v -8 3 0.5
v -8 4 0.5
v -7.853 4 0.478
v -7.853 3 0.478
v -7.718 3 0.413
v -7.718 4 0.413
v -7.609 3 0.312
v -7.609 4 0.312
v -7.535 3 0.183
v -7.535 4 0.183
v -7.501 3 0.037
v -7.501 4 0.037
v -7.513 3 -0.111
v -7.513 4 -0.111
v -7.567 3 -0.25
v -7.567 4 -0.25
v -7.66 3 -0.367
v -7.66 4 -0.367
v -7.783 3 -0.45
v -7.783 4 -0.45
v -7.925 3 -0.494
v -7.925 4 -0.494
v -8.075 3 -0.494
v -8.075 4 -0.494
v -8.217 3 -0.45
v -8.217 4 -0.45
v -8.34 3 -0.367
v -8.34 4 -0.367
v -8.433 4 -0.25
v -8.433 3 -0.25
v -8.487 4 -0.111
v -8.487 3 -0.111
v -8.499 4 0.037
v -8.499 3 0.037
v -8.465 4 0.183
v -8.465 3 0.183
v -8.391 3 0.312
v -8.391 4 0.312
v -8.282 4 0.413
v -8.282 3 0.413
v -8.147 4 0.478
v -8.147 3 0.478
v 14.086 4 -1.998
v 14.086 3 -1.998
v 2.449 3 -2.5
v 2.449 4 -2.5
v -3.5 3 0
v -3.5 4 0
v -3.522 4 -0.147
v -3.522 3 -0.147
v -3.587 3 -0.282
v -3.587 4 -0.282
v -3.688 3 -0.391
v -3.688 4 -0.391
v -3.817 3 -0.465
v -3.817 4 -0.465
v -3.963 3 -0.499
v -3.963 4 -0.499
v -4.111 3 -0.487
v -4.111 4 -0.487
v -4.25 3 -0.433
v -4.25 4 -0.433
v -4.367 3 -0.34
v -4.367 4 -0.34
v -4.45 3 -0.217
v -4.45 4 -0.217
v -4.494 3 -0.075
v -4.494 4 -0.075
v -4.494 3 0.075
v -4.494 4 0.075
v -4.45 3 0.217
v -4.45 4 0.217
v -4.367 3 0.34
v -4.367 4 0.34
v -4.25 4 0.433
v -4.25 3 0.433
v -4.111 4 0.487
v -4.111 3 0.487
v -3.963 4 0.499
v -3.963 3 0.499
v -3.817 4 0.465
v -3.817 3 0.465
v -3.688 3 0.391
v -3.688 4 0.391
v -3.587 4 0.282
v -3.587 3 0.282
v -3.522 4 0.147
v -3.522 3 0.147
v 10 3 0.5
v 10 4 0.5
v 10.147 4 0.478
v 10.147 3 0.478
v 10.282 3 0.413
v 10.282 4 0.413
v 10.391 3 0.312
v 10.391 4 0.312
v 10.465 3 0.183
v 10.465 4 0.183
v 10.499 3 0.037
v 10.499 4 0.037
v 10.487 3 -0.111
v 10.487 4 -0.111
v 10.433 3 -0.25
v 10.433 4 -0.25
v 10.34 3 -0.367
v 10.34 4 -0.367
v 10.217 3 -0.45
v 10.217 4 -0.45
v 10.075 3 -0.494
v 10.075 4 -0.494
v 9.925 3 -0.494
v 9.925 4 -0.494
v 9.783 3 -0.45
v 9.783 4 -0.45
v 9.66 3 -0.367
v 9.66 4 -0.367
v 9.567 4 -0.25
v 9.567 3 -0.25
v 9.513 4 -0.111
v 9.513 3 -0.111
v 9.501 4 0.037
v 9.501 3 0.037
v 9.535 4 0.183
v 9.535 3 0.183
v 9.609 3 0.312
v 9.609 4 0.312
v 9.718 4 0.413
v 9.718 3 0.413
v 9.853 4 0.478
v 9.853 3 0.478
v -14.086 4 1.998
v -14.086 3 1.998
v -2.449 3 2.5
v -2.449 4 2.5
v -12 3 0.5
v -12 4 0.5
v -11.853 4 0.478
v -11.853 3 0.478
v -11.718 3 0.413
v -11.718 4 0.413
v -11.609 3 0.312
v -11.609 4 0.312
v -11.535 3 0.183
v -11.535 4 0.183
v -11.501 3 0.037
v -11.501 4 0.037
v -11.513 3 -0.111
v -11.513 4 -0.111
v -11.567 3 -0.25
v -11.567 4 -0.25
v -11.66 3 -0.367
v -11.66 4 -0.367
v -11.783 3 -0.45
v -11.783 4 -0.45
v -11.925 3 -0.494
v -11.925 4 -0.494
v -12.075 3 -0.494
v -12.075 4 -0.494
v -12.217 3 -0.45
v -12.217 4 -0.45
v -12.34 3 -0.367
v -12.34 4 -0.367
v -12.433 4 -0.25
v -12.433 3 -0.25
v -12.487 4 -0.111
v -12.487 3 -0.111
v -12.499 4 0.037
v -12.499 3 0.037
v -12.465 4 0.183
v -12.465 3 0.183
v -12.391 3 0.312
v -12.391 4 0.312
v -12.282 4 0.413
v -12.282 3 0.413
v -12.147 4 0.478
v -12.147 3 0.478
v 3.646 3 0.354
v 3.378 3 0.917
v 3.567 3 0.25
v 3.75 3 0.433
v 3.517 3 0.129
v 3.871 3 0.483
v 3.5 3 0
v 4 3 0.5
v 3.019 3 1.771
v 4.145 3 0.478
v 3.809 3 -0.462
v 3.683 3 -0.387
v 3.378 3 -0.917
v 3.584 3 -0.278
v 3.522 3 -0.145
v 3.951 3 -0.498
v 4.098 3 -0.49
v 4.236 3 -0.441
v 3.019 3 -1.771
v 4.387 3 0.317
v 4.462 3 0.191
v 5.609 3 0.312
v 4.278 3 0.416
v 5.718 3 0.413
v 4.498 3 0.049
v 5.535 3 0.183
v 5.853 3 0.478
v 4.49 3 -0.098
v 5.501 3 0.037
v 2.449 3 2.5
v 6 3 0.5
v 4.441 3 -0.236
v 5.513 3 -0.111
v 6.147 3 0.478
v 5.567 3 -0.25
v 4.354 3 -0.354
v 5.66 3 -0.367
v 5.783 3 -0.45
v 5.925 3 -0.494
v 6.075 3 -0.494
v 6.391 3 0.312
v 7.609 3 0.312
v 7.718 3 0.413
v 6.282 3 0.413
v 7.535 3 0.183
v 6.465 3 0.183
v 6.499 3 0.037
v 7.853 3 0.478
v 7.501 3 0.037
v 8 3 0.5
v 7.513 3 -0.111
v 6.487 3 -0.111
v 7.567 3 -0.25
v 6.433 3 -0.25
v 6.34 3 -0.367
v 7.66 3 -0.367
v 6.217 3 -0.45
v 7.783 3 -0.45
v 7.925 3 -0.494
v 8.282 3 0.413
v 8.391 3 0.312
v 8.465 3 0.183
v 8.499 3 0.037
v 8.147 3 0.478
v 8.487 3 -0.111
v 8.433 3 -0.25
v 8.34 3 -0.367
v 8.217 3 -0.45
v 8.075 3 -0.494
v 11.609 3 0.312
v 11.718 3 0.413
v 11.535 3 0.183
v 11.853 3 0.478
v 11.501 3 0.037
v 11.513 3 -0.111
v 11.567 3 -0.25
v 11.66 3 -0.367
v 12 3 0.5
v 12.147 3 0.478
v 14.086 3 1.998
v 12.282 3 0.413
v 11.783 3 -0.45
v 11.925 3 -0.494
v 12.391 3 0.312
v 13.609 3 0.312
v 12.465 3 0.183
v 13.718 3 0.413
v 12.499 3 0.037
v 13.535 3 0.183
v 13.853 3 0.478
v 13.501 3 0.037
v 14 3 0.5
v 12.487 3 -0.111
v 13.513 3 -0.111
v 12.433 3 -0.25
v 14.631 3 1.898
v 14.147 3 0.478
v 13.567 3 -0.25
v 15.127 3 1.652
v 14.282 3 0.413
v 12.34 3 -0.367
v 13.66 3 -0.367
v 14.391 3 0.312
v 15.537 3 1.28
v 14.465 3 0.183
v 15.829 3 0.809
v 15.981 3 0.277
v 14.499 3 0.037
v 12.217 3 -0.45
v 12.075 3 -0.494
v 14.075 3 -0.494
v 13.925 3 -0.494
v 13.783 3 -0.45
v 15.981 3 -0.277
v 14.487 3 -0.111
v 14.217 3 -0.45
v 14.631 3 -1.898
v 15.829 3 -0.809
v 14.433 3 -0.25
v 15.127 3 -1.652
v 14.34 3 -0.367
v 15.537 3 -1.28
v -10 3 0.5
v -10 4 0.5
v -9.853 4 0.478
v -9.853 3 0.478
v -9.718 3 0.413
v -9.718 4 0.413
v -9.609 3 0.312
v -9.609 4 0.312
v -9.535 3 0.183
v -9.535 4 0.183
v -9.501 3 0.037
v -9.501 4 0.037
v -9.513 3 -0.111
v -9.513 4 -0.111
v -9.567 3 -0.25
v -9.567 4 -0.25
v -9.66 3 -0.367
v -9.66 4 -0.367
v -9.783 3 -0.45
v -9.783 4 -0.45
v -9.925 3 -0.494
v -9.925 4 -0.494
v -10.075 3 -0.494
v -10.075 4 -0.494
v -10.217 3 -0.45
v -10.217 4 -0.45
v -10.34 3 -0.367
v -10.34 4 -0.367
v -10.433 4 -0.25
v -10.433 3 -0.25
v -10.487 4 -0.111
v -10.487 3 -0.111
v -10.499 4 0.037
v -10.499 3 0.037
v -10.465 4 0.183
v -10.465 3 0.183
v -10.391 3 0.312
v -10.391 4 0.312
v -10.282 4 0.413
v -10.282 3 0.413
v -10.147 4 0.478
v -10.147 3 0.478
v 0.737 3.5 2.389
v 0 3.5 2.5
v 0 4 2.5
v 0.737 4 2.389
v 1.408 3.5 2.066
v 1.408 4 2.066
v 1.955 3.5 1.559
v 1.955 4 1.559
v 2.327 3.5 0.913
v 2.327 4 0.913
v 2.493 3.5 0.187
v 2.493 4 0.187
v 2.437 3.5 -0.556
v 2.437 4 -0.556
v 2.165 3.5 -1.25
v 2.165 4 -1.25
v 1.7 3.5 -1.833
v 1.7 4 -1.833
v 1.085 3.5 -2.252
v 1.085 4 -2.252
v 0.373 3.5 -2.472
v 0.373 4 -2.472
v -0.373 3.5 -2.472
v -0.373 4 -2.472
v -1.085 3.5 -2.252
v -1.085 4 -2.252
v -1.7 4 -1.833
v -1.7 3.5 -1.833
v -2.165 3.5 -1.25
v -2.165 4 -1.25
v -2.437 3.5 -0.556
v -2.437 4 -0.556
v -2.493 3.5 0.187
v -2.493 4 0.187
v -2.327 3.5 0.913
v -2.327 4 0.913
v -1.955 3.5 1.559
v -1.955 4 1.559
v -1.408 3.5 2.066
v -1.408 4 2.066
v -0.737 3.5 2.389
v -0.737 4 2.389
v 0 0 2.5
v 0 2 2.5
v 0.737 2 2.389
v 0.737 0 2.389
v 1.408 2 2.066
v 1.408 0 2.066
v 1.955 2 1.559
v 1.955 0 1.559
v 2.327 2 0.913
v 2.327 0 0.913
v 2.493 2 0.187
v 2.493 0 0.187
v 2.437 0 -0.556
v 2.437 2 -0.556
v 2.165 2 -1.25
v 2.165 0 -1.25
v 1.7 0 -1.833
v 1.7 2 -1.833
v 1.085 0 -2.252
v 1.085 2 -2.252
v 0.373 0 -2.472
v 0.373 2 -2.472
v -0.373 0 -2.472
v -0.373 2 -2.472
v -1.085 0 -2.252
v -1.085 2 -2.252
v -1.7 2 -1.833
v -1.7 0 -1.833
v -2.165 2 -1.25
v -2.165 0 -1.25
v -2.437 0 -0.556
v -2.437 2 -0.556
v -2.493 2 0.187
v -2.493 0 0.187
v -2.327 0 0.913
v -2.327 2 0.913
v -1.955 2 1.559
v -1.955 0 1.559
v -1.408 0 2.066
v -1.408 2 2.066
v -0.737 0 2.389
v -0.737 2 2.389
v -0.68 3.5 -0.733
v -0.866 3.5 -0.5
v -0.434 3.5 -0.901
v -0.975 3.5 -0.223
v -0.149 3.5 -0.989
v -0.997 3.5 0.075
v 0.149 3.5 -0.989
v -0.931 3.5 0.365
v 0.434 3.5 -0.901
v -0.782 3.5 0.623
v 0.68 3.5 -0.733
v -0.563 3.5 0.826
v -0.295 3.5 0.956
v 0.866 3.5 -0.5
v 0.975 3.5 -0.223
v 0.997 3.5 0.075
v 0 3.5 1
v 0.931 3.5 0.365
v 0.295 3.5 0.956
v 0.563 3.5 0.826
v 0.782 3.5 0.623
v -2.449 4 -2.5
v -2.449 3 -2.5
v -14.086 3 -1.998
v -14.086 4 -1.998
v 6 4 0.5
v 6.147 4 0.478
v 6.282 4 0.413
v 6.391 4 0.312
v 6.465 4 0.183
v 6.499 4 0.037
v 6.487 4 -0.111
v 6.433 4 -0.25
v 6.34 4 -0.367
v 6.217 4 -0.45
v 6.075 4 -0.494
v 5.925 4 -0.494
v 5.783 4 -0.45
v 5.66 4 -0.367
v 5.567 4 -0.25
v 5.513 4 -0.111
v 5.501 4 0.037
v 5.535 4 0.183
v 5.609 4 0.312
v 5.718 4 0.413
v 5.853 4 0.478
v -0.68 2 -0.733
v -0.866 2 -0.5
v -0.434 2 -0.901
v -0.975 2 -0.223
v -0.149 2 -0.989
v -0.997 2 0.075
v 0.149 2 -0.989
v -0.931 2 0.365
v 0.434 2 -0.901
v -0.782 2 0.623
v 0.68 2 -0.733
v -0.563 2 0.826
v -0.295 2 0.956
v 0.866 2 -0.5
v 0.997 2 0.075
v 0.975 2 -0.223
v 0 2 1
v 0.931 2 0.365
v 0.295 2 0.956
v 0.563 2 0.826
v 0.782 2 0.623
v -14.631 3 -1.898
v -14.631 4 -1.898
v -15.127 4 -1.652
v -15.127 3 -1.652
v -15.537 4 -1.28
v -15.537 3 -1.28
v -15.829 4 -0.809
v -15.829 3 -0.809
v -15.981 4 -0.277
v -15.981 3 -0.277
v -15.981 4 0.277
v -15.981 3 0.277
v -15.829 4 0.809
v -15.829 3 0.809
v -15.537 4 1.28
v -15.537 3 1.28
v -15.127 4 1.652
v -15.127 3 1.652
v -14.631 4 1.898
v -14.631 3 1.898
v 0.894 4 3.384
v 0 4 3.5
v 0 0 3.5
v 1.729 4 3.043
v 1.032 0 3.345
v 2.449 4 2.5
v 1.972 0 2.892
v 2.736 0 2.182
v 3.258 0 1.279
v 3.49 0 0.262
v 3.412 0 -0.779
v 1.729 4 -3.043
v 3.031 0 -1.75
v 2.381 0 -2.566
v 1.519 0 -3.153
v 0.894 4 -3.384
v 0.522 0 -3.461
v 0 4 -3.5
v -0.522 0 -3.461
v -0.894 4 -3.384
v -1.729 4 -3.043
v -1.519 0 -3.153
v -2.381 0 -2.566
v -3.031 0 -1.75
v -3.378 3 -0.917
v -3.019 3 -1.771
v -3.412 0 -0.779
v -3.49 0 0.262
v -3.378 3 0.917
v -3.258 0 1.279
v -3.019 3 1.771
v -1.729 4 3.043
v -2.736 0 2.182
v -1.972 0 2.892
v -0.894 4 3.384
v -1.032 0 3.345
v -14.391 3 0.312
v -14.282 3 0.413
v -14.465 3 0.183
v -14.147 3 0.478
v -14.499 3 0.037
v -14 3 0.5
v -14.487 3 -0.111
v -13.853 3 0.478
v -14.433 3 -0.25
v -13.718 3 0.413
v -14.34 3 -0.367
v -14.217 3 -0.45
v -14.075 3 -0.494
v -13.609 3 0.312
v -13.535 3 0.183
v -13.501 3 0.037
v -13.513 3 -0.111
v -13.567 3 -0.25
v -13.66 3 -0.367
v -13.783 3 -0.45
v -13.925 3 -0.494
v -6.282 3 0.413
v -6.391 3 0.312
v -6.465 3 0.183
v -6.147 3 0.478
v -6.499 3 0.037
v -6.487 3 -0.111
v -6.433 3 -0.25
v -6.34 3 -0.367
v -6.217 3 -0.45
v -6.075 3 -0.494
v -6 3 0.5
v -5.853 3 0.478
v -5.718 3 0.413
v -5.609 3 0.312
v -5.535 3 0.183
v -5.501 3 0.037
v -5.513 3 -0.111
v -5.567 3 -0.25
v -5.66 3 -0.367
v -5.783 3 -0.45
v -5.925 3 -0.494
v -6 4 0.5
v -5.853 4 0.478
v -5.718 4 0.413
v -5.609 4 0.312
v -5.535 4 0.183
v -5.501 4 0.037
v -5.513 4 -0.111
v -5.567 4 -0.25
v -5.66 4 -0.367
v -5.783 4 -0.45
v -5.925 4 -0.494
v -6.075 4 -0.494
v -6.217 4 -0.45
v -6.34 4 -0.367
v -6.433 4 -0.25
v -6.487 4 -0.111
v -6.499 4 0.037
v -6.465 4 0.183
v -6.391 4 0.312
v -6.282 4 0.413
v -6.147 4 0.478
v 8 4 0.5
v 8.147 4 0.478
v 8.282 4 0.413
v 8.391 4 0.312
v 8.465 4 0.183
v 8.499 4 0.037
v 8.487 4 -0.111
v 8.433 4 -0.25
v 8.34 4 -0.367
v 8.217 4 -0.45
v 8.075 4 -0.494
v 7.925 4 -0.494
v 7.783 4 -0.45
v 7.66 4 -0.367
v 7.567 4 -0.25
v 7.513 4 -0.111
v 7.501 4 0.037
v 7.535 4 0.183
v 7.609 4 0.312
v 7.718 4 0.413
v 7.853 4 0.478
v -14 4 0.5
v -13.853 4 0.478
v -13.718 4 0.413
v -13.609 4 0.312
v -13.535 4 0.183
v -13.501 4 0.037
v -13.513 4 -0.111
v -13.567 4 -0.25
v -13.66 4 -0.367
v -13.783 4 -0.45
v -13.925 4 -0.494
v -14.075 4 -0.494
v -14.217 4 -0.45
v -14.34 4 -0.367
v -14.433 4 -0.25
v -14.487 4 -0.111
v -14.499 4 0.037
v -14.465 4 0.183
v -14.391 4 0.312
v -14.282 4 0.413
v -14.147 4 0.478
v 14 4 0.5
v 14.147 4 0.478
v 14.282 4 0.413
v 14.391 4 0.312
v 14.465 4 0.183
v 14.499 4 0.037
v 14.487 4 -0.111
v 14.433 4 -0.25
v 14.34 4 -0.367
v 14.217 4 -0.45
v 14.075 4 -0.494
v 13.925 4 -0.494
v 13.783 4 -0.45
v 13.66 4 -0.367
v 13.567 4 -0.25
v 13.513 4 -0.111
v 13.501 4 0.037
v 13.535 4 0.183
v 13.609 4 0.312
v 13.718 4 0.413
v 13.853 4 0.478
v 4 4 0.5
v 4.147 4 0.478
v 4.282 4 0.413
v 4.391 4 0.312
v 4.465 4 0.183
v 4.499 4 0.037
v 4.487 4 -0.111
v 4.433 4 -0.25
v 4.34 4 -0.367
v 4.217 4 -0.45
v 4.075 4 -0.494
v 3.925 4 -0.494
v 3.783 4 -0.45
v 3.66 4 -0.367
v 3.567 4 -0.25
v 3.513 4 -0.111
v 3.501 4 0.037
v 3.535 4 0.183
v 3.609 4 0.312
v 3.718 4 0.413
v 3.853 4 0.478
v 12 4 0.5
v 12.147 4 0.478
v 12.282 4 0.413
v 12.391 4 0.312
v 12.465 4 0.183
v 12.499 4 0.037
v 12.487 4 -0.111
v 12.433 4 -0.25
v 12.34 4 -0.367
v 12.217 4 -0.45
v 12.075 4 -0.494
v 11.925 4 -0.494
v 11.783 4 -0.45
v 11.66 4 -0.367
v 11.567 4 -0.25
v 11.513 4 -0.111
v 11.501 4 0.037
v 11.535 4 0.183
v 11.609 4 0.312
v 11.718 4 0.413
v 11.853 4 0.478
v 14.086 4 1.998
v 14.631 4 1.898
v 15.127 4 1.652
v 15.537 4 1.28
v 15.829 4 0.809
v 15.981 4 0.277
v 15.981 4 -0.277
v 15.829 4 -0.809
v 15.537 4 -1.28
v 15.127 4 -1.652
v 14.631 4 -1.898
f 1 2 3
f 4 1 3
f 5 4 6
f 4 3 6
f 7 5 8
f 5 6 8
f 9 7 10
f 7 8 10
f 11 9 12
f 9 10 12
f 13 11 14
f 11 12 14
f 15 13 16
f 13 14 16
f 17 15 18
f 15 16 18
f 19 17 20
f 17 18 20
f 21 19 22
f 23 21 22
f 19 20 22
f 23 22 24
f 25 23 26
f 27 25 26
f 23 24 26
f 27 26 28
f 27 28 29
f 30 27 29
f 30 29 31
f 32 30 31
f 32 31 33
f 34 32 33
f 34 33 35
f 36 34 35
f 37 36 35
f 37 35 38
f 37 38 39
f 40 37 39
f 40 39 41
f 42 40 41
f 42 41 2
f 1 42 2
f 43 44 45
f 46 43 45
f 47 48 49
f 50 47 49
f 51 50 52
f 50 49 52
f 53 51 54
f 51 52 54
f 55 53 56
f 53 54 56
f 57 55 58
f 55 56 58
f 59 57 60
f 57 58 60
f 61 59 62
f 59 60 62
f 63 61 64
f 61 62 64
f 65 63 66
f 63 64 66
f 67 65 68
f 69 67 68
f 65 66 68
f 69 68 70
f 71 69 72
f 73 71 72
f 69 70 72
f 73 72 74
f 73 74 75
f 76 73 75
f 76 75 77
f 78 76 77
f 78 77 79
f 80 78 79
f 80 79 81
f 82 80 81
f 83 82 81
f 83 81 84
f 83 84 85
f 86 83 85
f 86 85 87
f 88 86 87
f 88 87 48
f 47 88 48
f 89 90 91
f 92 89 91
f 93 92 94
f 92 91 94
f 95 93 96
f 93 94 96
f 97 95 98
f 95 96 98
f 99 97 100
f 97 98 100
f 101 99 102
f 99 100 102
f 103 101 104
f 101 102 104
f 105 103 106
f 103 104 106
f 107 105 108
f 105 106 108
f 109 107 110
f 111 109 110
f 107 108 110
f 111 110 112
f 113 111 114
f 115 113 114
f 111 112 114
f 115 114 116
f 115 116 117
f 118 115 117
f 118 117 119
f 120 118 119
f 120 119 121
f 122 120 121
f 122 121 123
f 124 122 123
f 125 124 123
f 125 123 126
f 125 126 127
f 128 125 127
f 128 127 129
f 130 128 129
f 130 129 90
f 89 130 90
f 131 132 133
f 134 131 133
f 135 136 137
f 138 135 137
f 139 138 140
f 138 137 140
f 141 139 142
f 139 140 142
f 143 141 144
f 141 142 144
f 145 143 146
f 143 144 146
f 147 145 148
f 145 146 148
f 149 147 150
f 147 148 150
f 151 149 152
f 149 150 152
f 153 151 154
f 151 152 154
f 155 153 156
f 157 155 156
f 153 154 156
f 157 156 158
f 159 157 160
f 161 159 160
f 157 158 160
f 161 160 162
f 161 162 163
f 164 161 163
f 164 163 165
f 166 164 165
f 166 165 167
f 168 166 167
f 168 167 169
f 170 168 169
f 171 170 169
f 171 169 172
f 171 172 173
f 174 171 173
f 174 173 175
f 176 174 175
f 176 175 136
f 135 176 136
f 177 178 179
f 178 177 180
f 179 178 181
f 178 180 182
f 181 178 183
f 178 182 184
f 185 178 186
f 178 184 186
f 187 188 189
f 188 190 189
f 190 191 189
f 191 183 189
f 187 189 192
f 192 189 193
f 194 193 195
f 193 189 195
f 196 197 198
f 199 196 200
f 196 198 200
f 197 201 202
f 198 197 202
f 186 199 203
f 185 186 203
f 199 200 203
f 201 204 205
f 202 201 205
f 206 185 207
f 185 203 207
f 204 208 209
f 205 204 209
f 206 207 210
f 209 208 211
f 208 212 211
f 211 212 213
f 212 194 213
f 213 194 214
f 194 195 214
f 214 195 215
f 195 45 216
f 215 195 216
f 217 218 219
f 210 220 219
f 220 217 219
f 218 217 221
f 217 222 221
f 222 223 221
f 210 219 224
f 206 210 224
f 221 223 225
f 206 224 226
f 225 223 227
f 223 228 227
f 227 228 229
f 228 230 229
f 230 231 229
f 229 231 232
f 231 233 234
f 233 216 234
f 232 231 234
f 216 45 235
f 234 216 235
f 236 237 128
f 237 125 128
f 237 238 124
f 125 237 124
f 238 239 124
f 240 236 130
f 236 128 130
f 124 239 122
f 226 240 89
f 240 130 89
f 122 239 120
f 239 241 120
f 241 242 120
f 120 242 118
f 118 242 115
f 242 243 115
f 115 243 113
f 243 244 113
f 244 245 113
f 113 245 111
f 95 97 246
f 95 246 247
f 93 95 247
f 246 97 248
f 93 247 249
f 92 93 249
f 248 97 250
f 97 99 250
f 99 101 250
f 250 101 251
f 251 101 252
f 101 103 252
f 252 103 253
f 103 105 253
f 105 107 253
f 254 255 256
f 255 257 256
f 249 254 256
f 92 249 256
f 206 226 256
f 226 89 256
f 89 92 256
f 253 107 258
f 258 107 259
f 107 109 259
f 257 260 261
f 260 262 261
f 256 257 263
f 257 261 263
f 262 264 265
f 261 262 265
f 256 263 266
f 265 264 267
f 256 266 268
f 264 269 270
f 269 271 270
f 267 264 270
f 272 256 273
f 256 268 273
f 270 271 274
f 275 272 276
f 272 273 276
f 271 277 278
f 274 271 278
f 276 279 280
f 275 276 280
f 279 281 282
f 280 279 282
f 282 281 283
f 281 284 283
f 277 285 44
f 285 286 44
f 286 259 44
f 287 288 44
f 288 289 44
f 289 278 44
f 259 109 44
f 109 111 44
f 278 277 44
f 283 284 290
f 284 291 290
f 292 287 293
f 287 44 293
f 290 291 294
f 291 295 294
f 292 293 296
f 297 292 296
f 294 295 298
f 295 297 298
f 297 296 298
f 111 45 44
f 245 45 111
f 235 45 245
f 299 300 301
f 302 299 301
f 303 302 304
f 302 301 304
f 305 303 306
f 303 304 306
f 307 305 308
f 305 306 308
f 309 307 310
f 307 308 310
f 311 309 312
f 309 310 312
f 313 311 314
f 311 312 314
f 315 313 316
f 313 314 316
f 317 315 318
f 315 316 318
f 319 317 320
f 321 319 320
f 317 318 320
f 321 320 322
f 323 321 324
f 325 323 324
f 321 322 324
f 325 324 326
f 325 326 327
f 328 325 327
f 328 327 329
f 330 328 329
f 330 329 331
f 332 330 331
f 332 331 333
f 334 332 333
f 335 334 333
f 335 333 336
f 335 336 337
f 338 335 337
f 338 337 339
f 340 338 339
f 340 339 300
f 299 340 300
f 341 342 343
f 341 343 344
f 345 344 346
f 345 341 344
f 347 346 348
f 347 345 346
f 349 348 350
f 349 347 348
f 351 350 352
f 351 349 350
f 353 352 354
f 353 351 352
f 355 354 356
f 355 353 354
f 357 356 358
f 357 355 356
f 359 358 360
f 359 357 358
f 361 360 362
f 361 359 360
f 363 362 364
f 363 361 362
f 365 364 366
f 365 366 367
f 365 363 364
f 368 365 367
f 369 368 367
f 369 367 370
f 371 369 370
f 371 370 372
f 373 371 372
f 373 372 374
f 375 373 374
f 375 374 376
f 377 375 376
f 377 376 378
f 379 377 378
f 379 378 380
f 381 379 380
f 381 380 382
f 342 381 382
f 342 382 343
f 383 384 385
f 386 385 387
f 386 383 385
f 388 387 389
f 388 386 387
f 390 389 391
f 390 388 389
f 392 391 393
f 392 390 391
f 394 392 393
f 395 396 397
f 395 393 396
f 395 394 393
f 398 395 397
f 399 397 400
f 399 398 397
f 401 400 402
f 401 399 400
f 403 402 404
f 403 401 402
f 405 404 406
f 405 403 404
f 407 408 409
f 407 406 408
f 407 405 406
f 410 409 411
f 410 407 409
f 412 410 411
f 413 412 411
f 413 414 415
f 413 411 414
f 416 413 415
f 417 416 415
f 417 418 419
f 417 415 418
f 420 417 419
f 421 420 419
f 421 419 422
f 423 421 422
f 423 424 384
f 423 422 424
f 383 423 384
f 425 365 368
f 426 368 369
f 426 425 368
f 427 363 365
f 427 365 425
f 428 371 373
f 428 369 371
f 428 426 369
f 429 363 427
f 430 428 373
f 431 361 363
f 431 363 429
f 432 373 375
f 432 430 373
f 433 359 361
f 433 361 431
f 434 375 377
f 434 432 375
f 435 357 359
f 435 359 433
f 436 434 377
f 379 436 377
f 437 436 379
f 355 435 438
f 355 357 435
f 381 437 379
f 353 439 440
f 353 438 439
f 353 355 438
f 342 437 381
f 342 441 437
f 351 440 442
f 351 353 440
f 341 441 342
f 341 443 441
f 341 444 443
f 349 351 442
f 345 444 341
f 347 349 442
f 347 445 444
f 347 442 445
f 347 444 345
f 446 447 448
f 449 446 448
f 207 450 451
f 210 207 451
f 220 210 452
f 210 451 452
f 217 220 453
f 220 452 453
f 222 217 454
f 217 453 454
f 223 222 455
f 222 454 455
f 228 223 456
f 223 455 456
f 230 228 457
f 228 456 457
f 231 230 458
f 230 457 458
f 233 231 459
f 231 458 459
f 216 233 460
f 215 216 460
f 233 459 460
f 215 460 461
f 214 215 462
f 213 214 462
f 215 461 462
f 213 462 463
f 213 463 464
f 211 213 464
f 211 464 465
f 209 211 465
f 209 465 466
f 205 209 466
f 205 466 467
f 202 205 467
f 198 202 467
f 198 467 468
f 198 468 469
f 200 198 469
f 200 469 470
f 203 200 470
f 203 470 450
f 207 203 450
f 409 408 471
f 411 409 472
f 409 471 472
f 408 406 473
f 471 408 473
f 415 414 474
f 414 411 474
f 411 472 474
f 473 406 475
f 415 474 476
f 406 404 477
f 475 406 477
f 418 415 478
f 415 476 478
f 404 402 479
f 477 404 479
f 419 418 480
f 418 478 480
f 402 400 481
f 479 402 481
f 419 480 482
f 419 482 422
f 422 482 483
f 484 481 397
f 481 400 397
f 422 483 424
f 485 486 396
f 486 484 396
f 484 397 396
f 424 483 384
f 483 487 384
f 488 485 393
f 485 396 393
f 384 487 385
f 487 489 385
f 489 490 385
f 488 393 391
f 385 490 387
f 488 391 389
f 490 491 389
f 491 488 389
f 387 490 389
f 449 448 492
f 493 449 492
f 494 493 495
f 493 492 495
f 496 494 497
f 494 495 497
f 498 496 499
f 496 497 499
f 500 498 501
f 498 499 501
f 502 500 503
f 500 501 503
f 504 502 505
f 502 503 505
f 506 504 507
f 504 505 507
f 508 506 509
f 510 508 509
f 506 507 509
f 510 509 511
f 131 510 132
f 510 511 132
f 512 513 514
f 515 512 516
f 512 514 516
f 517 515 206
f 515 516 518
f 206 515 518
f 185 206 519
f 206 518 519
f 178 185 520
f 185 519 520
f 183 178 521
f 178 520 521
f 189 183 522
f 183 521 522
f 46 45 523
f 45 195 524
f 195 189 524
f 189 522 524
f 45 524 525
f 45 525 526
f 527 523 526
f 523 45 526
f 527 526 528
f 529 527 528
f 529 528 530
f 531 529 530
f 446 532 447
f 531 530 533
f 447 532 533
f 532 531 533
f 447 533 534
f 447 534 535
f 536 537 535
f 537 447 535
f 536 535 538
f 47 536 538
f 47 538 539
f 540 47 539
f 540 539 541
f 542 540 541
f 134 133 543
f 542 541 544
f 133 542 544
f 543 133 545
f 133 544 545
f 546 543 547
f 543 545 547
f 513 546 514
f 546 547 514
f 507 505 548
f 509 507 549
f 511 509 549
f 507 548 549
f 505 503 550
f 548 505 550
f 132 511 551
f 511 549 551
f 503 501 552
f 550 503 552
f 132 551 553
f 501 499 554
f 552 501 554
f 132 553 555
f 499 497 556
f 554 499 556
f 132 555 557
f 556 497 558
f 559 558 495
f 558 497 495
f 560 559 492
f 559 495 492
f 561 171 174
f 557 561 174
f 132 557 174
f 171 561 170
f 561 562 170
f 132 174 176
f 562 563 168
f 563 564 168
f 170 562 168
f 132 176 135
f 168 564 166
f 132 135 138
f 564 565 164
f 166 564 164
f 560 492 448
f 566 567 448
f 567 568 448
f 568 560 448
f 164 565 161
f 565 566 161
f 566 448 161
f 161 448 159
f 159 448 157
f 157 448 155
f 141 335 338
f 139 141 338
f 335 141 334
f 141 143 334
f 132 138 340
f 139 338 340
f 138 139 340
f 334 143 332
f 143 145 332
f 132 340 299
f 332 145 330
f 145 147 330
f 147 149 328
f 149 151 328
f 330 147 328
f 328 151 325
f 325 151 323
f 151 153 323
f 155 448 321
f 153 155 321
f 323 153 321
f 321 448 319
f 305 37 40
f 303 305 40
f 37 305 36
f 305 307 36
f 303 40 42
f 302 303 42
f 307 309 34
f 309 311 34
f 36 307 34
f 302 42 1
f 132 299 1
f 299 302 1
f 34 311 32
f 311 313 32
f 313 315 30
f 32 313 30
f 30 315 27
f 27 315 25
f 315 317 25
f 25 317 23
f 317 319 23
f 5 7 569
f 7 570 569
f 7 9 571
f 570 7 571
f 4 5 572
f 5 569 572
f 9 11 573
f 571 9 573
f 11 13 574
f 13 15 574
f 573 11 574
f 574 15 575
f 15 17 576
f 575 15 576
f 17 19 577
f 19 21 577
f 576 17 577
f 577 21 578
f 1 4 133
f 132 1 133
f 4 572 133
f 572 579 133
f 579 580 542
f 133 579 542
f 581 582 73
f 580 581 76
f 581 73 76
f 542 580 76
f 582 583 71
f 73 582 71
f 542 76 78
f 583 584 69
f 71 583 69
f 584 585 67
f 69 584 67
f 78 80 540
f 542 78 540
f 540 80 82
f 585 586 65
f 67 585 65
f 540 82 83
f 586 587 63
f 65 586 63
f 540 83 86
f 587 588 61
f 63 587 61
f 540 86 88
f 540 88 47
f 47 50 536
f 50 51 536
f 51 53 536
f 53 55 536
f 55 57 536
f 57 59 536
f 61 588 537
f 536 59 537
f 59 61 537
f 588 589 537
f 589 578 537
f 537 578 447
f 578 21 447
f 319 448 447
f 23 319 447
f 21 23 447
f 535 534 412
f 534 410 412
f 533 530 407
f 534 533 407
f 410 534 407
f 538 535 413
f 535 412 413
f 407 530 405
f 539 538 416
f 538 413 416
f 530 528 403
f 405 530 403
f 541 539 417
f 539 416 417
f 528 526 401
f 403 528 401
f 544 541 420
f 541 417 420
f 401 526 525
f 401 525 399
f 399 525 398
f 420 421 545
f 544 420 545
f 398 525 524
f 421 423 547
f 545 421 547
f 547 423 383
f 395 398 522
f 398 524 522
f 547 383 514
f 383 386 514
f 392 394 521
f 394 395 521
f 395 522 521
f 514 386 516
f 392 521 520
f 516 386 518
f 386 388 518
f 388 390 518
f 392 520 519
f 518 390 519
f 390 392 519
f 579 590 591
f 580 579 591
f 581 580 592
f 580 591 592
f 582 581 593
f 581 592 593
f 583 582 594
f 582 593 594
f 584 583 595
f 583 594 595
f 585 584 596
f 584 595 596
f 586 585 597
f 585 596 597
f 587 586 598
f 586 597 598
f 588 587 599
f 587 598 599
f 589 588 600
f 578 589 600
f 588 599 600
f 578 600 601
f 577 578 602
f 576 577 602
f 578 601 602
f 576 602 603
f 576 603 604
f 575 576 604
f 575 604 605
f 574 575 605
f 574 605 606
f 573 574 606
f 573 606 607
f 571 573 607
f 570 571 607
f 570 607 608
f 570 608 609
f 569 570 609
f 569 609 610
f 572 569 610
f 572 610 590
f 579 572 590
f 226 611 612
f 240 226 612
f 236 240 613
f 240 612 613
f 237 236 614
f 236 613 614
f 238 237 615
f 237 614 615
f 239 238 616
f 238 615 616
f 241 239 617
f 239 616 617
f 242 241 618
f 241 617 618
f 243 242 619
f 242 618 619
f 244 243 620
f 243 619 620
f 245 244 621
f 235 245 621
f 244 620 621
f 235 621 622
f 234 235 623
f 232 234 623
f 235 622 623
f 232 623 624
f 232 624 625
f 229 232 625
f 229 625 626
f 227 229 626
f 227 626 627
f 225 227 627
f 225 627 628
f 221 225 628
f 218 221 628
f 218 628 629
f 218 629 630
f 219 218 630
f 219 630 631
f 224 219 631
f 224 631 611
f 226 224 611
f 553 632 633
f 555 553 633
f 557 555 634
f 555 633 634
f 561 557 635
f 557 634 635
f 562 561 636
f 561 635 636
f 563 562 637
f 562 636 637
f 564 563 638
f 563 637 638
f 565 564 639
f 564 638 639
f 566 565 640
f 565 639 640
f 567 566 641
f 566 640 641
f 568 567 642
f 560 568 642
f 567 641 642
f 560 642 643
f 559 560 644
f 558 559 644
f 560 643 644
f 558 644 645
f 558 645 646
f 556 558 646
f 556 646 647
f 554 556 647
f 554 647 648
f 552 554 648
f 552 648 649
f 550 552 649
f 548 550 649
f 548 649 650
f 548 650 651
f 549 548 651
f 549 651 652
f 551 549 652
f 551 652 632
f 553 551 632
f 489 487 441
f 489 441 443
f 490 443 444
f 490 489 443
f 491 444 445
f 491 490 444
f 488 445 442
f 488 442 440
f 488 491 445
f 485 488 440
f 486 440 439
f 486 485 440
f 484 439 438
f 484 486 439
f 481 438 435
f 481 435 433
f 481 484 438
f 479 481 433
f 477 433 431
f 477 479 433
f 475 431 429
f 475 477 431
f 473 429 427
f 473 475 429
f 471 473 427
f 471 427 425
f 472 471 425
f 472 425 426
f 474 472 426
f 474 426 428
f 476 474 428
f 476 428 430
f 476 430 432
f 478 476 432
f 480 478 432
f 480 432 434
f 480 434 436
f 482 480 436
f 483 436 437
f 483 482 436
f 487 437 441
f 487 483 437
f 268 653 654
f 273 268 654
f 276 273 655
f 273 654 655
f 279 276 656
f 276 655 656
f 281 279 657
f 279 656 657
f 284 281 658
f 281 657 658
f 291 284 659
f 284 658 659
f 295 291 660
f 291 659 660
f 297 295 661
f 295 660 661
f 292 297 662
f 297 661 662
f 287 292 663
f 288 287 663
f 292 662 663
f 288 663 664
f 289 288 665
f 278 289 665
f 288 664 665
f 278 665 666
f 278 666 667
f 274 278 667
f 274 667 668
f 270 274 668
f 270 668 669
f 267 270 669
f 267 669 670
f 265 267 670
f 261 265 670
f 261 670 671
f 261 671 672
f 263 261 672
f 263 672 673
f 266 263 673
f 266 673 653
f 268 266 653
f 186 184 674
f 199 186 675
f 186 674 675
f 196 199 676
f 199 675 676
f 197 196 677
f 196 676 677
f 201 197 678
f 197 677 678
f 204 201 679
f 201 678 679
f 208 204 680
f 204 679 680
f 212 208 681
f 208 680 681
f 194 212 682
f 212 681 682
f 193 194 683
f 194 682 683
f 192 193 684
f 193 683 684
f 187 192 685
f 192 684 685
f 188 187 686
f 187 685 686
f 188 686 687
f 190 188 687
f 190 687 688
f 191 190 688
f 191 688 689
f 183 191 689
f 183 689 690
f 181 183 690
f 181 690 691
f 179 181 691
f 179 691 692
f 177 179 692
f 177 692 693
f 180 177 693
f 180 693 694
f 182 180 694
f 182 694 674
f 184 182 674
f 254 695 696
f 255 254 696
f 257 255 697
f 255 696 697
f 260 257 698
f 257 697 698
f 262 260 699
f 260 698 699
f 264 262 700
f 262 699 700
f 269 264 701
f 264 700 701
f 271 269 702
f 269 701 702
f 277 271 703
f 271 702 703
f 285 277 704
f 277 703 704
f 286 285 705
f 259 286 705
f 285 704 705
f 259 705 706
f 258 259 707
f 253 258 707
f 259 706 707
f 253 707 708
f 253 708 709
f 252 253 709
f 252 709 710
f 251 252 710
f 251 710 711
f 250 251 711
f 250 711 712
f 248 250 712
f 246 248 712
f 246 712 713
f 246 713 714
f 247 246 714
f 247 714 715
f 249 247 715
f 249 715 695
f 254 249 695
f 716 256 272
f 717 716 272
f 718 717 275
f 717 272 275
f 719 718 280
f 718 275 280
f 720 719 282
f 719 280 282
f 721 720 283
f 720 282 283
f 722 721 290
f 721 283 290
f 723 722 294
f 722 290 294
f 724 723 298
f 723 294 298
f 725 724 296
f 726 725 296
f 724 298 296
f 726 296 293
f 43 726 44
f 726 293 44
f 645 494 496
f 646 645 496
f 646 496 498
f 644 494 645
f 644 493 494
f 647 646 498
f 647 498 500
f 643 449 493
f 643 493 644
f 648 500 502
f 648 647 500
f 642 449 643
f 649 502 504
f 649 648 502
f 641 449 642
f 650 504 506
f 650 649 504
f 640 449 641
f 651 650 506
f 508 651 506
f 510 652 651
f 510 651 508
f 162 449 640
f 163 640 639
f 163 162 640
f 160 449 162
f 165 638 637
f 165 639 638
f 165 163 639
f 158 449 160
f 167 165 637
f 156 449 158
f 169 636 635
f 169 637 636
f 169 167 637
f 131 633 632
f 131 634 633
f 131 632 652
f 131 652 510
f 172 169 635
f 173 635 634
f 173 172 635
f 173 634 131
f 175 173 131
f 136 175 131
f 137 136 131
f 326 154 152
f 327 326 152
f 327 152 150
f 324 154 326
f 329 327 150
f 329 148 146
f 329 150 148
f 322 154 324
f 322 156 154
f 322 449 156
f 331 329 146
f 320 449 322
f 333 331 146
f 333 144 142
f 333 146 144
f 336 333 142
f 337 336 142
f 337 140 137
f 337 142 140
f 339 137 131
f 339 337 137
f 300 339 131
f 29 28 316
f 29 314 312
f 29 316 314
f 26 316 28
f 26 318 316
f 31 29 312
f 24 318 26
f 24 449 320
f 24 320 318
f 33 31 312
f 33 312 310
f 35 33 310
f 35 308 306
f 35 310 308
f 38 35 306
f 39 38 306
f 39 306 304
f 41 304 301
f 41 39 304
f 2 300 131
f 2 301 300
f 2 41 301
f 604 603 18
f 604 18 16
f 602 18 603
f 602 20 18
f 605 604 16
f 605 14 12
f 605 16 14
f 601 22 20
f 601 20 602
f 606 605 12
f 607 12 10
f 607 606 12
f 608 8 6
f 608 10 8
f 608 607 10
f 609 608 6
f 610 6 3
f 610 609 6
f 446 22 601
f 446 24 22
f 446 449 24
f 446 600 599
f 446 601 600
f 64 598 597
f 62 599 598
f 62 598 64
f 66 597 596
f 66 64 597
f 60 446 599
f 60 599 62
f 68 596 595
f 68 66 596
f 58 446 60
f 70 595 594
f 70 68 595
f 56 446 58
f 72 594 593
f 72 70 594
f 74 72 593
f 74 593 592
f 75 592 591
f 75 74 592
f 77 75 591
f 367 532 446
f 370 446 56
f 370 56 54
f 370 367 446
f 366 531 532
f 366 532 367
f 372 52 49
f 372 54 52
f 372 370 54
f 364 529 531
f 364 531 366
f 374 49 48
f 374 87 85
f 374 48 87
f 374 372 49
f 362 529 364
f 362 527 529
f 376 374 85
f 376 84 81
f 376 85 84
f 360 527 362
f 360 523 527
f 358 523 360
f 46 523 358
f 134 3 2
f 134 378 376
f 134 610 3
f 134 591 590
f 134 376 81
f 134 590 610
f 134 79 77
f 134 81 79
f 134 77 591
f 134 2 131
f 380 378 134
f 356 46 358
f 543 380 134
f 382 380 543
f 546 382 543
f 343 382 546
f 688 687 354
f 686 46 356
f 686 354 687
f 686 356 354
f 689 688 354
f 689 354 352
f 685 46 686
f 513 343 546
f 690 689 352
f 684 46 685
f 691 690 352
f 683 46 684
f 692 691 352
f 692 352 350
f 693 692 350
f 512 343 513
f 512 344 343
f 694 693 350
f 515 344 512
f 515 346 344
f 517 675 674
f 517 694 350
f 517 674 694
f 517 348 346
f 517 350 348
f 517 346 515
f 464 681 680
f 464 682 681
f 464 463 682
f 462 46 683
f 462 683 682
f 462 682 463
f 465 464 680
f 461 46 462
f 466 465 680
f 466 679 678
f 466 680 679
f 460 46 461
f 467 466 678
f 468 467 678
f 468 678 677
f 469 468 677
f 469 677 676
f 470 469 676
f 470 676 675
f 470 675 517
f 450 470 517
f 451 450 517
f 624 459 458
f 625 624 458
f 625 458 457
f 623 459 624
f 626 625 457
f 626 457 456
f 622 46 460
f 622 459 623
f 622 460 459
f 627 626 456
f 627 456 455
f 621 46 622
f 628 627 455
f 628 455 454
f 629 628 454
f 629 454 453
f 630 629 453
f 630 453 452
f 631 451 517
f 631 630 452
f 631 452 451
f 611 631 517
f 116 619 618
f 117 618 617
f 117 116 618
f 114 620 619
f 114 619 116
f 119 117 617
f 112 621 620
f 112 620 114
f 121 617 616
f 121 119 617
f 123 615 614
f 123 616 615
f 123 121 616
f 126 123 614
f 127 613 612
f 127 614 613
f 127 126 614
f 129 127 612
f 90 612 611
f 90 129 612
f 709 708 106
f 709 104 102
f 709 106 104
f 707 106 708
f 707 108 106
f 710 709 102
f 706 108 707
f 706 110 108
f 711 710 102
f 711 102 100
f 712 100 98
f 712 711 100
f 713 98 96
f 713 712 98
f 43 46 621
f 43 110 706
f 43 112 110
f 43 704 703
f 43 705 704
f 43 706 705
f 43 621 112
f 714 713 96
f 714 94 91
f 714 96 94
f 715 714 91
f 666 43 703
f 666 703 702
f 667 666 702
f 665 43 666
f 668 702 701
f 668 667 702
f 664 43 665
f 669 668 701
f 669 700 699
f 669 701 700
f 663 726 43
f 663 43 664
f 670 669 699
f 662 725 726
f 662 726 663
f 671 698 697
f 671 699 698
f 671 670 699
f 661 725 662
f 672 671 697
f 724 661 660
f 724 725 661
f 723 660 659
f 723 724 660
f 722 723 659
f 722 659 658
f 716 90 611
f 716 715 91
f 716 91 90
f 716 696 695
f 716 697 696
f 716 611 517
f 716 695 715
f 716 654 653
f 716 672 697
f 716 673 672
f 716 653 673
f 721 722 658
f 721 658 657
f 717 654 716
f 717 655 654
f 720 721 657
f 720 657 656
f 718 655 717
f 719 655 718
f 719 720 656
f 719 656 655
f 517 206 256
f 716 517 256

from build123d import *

# Parameters (mm, degrees)
SKETCH1_R           = 3.5
SKETCH1_R_2         = 2.5
BOSS_EXTRUDE1_DEPTH = 4
BOSS_EXTRUDE2_START = -2
SKETCH2_R           = 3.5
SKETCH2_R_2         = 1
BOSS_EXTRUDE2_DEPTH = 1.5
BOSS_EXTRUDE3_START = -1
BOSS_EXTRUDE3_DEPTH = 1
CUT_EXTRUDE1_REACH  = 18.86
SKETCH4_R           = 0.5


with BuildPart() as part:
    # Sketch1 → Boss-Extrude1 (new body)
    with BuildSketch(Plane(origin=(0, 0, 0), x_dir=(1, 0, 0), z_dir=(0, 1, 0))):
        with Locations(Location((0, 0, 0), (0, 0, 270))):
            Circle(SKETCH1_R)
        with Locations(Location((0, 0, 0), (0, 0, 270))):
            Circle(SKETCH1_R_2, mode=Mode.SUBTRACT)
    extrude(amount=BOSS_EXTRUDE1_DEPTH)

    # Sketch2 → Boss-Extrude2 (add)
    with BuildSketch(Plane(origin=(0, 4, 0), x_dir=(1, 0, 0), z_dir=(0, 1, 0)).offset(BOSS_EXTRUDE2_START)):
        with Locations(Location((0, 0, 0), (0, 0, 270))):
            Circle(SKETCH2_R)
        with Locations(Location((0, 0, 0), (0, 0, 270))):
            Circle(SKETCH2_R_2, mode=Mode.SUBTRACT)
    extrude(amount=BOSS_EXTRUDE2_DEPTH)

    # Sketch3 → Boss-Extrude3 (add)
    with BuildSketch(Plane(origin=(0, 4, 0), x_dir=(1, 0, 0), z_dir=(0, 1, 0)).offset(BOSS_EXTRUDE3_START)):
        with BuildLine():
            ThreePointArc((-2.449489743, -2.5), (-3.5, 0), (-2.449489743, 2.5))
            Line((-2.449489743, 2.5), (-14.086174253, 1.998142637))
            ThreePointArc((-14.086174253, 1.998142637), (-16, 0), (-14.086174253, -1.998142637))
            Line((-14.086174253, -1.998142637), (-2.449489743, -2.5))
        make_face()
        with BuildLine():
            Line((2.449489743, -2.5), (14.086174253, -1.998142637))
            ThreePointArc((14.086174253, -1.998142637), (16, 0), (14.086174253, 1.998142637))
            Line((14.086174253, 1.998142637), (2.449489743, 2.5))
            ThreePointArc((2.449489743, 2.5), (3.5, 0), (2.449489743, -2.5))
        make_face()
    extrude(amount=BOSS_EXTRUDE3_DEPTH)

    # Sketch4 → Cut-Extrude1 (cut, up to next)
    with BuildSketch(Plane(origin=(0, 4, 0), x_dir=(1, 0, 0), z_dir=(0, 1, 0)), mode=Mode.PRIVATE) as cut_extrude1_sk1:
        with Locations(Location((4, 0, 0), (0, 0, 270))):
            Circle(SKETCH4_R)
    cut_extrude1_tool1 = extrude(cut_extrude1_sk1.sketch, amount=-CUT_EXTRUDE1_REACH, mode=Mode.PRIVATE) & part.part
    # Sketch4 → Cut-Extrude1 (cut, up to next)
    with BuildSketch(Plane(origin=(0, 4, 0), x_dir=(1, 0, 0), z_dir=(0, 1, 0)), mode=Mode.PRIVATE) as cut_extrude1_sk2:
        with Locations(Location((6, 0, 0), (0, 0, 270))):
            Circle(SKETCH4_R)
    cut_extrude1_tool2 = extrude(cut_extrude1_sk2.sketch, amount=-CUT_EXTRUDE1_REACH, mode=Mode.PRIVATE) & part.part
    # Sketch4 → Cut-Extrude1 (cut, up to next)
    with BuildSketch(Plane(origin=(0, 4, 0), x_dir=(1, 0, 0), z_dir=(0, 1, 0)), mode=Mode.PRIVATE) as cut_extrude1_sk3:
        with Locations(Location((8, 0, 0), (0, 0, 270))):
            Circle(SKETCH4_R)
    cut_extrude1_tool3 = extrude(cut_extrude1_sk3.sketch, amount=-CUT_EXTRUDE1_REACH, mode=Mode.PRIVATE) & part.part
    # Sketch4 → Cut-Extrude1 (cut, up to next)
    with BuildSketch(Plane(origin=(0, 4, 0), x_dir=(1, 0, 0), z_dir=(0, 1, 0)), mode=Mode.PRIVATE) as cut_extrude1_sk4:
        with Locations(Location((10, 0, 0), (0, 0, 270))):
            Circle(SKETCH4_R)
    cut_extrude1_tool4 = extrude(cut_extrude1_sk4.sketch, amount=-CUT_EXTRUDE1_REACH, mode=Mode.PRIVATE) & part.part
    # Sketch4 → Cut-Extrude1 (cut, up to next)
    with BuildSketch(Plane(origin=(0, 4, 0), x_dir=(1, 0, 0), z_dir=(0, 1, 0)), mode=Mode.PRIVATE) as cut_extrude1_sk5:
        with Locations(Location((12, 0, 0), (0, 0, 270))):
            Circle(SKETCH4_R)
    cut_extrude1_tool5 = extrude(cut_extrude1_sk5.sketch, amount=-CUT_EXTRUDE1_REACH, mode=Mode.PRIVATE) & part.part
    # Sketch4 → Cut-Extrude1 (cut, up to next)
    with BuildSketch(Plane(origin=(0, 4, 0), x_dir=(1, 0, 0), z_dir=(0, 1, 0)), mode=Mode.PRIVATE) as cut_extrude1_sk6:
        with Locations(Location((14, 0, 0), (0, 0, 270))):
            Circle(SKETCH4_R)
    cut_extrude1_tool6 = extrude(cut_extrude1_sk6.sketch, amount=-CUT_EXTRUDE1_REACH, mode=Mode.PRIVATE) & part.part
    # Sketch4 → Cut-Extrude1 (cut, up to next)
    with BuildSketch(Plane(origin=(0, 4, 0), x_dir=(1, 0, 0), z_dir=(0, 1, 0)), mode=Mode.PRIVATE) as cut_extrude1_sk7:
        with Locations(Location((-14, 0, 0), (0, 0, 270))):
            Circle(SKETCH4_R)
    cut_extrude1_tool7 = extrude(cut_extrude1_sk7.sketch, amount=-CUT_EXTRUDE1_REACH, mode=Mode.PRIVATE) & part.part
    # Sketch4 → Cut-Extrude1 (cut, up to next)
    with BuildSketch(Plane(origin=(0, 4, 0), x_dir=(1, 0, 0), z_dir=(0, 1, 0)), mode=Mode.PRIVATE) as cut_extrude1_sk8:
        with Locations(Location((-12, 0, 0), (0, 0, 270))):
            Circle(SKETCH4_R)
    cut_extrude1_tool8 = extrude(cut_extrude1_sk8.sketch, amount=-CUT_EXTRUDE1_REACH, mode=Mode.PRIVATE) & part.part
    # Sketch4 → Cut-Extrude1 (cut, up to next)
    with BuildSketch(Plane(origin=(0, 4, 0), x_dir=(1, 0, 0), z_dir=(0, 1, 0)), mode=Mode.PRIVATE) as cut_extrude1_sk9:
        with Locations(Location((-10, 0, 0), (0, 0, 270))):
            Circle(SKETCH4_R)
    cut_extrude1_tool9 = extrude(cut_extrude1_sk9.sketch, amount=-CUT_EXTRUDE1_REACH, mode=Mode.PRIVATE) & part.part
    # Sketch4 → Cut-Extrude1 (cut, up to next)
    with BuildSketch(Plane(origin=(0, 4, 0), x_dir=(1, 0, 0), z_dir=(0, 1, 0)), mode=Mode.PRIVATE) as cut_extrude1_sk10:
        with Locations(Location((-8, 0, 0), (0, 0, 270))):
            Circle(SKETCH4_R)
    cut_extrude1_tool10 = extrude(cut_extrude1_sk10.sketch, amount=-CUT_EXTRUDE1_REACH, mode=Mode.PRIVATE) & part.part
    # Sketch4 → Cut-Extrude1 (cut, up to next)
    with BuildSketch(Plane(origin=(0, 4, 0), x_dir=(1, 0, 0), z_dir=(0, 1, 0)), mode=Mode.PRIVATE) as cut_extrude1_sk11:
        with Locations(Location((-6, 0, 0), (0, 0, 270))):
            Circle(SKETCH4_R)
    cut_extrude1_tool11 = extrude(cut_extrude1_sk11.sketch, amount=-CUT_EXTRUDE1_REACH, mode=Mode.PRIVATE) & part.part
    # Sketch4 → Cut-Extrude1 (cut, up to next)
    with BuildSketch(Plane(origin=(0, 4, 0), x_dir=(1, 0, 0), z_dir=(0, 1, 0)), mode=Mode.PRIVATE) as cut_extrude1_sk12:
        with Locations(Location((-4, 0, 0), (0, 0, 359.998928085))):
            Circle(SKETCH4_R)
    cut_extrude1_tool12 = extrude(cut_extrude1_sk12.sketch, amount=-CUT_EXTRUDE1_REACH, mode=Mode.PRIVATE) & part.part
    add(cut_extrude1_tool1.solids().sort_by_distance((4, 4, 0))[0], mode=Mode.SUBTRACT)
    add(cut_extrude1_tool2.solids().sort_by_distance((6, 4, 0))[0], mode=Mode.SUBTRACT)
    add(cut_extrude1_tool3.solids().sort_by_distance((8, 4, 0))[0], mode=Mode.SUBTRACT)
    add(cut_extrude1_tool4.solids().sort_by_distance((10, 4, 0))[0], mode=Mode.SUBTRACT)
    add(cut_extrude1_tool5.solids().sort_by_distance((12, 4, 0))[0], mode=Mode.SUBTRACT)
    add(cut_extrude1_tool6.solids().sort_by_distance((14, 4, 0))[0], mode=Mode.SUBTRACT)
    add(cut_extrude1_tool7.solids().sort_by_distance((-14, 4, 0))[0], mode=Mode.SUBTRACT)
    add(cut_extrude1_tool8.solids().sort_by_distance((-12, 4, 0))[0], mode=Mode.SUBTRACT)
    add(cut_extrude1_tool9.solids().sort_by_distance((-10, 4, 0))[0], mode=Mode.SUBTRACT)
    add(cut_extrude1_tool10.solids().sort_by_distance((-8, 4, 0))[0], mode=Mode.SUBTRACT)
    add(cut_extrude1_tool11.solids().sort_by_distance((-6, 4, 0))[0], mode=Mode.SUBTRACT)
    add(cut_extrude1_tool12.solids().sort_by_distance((-4, 4, 0))[0], mode=Mode.SUBTRACT)


solid = part.part
